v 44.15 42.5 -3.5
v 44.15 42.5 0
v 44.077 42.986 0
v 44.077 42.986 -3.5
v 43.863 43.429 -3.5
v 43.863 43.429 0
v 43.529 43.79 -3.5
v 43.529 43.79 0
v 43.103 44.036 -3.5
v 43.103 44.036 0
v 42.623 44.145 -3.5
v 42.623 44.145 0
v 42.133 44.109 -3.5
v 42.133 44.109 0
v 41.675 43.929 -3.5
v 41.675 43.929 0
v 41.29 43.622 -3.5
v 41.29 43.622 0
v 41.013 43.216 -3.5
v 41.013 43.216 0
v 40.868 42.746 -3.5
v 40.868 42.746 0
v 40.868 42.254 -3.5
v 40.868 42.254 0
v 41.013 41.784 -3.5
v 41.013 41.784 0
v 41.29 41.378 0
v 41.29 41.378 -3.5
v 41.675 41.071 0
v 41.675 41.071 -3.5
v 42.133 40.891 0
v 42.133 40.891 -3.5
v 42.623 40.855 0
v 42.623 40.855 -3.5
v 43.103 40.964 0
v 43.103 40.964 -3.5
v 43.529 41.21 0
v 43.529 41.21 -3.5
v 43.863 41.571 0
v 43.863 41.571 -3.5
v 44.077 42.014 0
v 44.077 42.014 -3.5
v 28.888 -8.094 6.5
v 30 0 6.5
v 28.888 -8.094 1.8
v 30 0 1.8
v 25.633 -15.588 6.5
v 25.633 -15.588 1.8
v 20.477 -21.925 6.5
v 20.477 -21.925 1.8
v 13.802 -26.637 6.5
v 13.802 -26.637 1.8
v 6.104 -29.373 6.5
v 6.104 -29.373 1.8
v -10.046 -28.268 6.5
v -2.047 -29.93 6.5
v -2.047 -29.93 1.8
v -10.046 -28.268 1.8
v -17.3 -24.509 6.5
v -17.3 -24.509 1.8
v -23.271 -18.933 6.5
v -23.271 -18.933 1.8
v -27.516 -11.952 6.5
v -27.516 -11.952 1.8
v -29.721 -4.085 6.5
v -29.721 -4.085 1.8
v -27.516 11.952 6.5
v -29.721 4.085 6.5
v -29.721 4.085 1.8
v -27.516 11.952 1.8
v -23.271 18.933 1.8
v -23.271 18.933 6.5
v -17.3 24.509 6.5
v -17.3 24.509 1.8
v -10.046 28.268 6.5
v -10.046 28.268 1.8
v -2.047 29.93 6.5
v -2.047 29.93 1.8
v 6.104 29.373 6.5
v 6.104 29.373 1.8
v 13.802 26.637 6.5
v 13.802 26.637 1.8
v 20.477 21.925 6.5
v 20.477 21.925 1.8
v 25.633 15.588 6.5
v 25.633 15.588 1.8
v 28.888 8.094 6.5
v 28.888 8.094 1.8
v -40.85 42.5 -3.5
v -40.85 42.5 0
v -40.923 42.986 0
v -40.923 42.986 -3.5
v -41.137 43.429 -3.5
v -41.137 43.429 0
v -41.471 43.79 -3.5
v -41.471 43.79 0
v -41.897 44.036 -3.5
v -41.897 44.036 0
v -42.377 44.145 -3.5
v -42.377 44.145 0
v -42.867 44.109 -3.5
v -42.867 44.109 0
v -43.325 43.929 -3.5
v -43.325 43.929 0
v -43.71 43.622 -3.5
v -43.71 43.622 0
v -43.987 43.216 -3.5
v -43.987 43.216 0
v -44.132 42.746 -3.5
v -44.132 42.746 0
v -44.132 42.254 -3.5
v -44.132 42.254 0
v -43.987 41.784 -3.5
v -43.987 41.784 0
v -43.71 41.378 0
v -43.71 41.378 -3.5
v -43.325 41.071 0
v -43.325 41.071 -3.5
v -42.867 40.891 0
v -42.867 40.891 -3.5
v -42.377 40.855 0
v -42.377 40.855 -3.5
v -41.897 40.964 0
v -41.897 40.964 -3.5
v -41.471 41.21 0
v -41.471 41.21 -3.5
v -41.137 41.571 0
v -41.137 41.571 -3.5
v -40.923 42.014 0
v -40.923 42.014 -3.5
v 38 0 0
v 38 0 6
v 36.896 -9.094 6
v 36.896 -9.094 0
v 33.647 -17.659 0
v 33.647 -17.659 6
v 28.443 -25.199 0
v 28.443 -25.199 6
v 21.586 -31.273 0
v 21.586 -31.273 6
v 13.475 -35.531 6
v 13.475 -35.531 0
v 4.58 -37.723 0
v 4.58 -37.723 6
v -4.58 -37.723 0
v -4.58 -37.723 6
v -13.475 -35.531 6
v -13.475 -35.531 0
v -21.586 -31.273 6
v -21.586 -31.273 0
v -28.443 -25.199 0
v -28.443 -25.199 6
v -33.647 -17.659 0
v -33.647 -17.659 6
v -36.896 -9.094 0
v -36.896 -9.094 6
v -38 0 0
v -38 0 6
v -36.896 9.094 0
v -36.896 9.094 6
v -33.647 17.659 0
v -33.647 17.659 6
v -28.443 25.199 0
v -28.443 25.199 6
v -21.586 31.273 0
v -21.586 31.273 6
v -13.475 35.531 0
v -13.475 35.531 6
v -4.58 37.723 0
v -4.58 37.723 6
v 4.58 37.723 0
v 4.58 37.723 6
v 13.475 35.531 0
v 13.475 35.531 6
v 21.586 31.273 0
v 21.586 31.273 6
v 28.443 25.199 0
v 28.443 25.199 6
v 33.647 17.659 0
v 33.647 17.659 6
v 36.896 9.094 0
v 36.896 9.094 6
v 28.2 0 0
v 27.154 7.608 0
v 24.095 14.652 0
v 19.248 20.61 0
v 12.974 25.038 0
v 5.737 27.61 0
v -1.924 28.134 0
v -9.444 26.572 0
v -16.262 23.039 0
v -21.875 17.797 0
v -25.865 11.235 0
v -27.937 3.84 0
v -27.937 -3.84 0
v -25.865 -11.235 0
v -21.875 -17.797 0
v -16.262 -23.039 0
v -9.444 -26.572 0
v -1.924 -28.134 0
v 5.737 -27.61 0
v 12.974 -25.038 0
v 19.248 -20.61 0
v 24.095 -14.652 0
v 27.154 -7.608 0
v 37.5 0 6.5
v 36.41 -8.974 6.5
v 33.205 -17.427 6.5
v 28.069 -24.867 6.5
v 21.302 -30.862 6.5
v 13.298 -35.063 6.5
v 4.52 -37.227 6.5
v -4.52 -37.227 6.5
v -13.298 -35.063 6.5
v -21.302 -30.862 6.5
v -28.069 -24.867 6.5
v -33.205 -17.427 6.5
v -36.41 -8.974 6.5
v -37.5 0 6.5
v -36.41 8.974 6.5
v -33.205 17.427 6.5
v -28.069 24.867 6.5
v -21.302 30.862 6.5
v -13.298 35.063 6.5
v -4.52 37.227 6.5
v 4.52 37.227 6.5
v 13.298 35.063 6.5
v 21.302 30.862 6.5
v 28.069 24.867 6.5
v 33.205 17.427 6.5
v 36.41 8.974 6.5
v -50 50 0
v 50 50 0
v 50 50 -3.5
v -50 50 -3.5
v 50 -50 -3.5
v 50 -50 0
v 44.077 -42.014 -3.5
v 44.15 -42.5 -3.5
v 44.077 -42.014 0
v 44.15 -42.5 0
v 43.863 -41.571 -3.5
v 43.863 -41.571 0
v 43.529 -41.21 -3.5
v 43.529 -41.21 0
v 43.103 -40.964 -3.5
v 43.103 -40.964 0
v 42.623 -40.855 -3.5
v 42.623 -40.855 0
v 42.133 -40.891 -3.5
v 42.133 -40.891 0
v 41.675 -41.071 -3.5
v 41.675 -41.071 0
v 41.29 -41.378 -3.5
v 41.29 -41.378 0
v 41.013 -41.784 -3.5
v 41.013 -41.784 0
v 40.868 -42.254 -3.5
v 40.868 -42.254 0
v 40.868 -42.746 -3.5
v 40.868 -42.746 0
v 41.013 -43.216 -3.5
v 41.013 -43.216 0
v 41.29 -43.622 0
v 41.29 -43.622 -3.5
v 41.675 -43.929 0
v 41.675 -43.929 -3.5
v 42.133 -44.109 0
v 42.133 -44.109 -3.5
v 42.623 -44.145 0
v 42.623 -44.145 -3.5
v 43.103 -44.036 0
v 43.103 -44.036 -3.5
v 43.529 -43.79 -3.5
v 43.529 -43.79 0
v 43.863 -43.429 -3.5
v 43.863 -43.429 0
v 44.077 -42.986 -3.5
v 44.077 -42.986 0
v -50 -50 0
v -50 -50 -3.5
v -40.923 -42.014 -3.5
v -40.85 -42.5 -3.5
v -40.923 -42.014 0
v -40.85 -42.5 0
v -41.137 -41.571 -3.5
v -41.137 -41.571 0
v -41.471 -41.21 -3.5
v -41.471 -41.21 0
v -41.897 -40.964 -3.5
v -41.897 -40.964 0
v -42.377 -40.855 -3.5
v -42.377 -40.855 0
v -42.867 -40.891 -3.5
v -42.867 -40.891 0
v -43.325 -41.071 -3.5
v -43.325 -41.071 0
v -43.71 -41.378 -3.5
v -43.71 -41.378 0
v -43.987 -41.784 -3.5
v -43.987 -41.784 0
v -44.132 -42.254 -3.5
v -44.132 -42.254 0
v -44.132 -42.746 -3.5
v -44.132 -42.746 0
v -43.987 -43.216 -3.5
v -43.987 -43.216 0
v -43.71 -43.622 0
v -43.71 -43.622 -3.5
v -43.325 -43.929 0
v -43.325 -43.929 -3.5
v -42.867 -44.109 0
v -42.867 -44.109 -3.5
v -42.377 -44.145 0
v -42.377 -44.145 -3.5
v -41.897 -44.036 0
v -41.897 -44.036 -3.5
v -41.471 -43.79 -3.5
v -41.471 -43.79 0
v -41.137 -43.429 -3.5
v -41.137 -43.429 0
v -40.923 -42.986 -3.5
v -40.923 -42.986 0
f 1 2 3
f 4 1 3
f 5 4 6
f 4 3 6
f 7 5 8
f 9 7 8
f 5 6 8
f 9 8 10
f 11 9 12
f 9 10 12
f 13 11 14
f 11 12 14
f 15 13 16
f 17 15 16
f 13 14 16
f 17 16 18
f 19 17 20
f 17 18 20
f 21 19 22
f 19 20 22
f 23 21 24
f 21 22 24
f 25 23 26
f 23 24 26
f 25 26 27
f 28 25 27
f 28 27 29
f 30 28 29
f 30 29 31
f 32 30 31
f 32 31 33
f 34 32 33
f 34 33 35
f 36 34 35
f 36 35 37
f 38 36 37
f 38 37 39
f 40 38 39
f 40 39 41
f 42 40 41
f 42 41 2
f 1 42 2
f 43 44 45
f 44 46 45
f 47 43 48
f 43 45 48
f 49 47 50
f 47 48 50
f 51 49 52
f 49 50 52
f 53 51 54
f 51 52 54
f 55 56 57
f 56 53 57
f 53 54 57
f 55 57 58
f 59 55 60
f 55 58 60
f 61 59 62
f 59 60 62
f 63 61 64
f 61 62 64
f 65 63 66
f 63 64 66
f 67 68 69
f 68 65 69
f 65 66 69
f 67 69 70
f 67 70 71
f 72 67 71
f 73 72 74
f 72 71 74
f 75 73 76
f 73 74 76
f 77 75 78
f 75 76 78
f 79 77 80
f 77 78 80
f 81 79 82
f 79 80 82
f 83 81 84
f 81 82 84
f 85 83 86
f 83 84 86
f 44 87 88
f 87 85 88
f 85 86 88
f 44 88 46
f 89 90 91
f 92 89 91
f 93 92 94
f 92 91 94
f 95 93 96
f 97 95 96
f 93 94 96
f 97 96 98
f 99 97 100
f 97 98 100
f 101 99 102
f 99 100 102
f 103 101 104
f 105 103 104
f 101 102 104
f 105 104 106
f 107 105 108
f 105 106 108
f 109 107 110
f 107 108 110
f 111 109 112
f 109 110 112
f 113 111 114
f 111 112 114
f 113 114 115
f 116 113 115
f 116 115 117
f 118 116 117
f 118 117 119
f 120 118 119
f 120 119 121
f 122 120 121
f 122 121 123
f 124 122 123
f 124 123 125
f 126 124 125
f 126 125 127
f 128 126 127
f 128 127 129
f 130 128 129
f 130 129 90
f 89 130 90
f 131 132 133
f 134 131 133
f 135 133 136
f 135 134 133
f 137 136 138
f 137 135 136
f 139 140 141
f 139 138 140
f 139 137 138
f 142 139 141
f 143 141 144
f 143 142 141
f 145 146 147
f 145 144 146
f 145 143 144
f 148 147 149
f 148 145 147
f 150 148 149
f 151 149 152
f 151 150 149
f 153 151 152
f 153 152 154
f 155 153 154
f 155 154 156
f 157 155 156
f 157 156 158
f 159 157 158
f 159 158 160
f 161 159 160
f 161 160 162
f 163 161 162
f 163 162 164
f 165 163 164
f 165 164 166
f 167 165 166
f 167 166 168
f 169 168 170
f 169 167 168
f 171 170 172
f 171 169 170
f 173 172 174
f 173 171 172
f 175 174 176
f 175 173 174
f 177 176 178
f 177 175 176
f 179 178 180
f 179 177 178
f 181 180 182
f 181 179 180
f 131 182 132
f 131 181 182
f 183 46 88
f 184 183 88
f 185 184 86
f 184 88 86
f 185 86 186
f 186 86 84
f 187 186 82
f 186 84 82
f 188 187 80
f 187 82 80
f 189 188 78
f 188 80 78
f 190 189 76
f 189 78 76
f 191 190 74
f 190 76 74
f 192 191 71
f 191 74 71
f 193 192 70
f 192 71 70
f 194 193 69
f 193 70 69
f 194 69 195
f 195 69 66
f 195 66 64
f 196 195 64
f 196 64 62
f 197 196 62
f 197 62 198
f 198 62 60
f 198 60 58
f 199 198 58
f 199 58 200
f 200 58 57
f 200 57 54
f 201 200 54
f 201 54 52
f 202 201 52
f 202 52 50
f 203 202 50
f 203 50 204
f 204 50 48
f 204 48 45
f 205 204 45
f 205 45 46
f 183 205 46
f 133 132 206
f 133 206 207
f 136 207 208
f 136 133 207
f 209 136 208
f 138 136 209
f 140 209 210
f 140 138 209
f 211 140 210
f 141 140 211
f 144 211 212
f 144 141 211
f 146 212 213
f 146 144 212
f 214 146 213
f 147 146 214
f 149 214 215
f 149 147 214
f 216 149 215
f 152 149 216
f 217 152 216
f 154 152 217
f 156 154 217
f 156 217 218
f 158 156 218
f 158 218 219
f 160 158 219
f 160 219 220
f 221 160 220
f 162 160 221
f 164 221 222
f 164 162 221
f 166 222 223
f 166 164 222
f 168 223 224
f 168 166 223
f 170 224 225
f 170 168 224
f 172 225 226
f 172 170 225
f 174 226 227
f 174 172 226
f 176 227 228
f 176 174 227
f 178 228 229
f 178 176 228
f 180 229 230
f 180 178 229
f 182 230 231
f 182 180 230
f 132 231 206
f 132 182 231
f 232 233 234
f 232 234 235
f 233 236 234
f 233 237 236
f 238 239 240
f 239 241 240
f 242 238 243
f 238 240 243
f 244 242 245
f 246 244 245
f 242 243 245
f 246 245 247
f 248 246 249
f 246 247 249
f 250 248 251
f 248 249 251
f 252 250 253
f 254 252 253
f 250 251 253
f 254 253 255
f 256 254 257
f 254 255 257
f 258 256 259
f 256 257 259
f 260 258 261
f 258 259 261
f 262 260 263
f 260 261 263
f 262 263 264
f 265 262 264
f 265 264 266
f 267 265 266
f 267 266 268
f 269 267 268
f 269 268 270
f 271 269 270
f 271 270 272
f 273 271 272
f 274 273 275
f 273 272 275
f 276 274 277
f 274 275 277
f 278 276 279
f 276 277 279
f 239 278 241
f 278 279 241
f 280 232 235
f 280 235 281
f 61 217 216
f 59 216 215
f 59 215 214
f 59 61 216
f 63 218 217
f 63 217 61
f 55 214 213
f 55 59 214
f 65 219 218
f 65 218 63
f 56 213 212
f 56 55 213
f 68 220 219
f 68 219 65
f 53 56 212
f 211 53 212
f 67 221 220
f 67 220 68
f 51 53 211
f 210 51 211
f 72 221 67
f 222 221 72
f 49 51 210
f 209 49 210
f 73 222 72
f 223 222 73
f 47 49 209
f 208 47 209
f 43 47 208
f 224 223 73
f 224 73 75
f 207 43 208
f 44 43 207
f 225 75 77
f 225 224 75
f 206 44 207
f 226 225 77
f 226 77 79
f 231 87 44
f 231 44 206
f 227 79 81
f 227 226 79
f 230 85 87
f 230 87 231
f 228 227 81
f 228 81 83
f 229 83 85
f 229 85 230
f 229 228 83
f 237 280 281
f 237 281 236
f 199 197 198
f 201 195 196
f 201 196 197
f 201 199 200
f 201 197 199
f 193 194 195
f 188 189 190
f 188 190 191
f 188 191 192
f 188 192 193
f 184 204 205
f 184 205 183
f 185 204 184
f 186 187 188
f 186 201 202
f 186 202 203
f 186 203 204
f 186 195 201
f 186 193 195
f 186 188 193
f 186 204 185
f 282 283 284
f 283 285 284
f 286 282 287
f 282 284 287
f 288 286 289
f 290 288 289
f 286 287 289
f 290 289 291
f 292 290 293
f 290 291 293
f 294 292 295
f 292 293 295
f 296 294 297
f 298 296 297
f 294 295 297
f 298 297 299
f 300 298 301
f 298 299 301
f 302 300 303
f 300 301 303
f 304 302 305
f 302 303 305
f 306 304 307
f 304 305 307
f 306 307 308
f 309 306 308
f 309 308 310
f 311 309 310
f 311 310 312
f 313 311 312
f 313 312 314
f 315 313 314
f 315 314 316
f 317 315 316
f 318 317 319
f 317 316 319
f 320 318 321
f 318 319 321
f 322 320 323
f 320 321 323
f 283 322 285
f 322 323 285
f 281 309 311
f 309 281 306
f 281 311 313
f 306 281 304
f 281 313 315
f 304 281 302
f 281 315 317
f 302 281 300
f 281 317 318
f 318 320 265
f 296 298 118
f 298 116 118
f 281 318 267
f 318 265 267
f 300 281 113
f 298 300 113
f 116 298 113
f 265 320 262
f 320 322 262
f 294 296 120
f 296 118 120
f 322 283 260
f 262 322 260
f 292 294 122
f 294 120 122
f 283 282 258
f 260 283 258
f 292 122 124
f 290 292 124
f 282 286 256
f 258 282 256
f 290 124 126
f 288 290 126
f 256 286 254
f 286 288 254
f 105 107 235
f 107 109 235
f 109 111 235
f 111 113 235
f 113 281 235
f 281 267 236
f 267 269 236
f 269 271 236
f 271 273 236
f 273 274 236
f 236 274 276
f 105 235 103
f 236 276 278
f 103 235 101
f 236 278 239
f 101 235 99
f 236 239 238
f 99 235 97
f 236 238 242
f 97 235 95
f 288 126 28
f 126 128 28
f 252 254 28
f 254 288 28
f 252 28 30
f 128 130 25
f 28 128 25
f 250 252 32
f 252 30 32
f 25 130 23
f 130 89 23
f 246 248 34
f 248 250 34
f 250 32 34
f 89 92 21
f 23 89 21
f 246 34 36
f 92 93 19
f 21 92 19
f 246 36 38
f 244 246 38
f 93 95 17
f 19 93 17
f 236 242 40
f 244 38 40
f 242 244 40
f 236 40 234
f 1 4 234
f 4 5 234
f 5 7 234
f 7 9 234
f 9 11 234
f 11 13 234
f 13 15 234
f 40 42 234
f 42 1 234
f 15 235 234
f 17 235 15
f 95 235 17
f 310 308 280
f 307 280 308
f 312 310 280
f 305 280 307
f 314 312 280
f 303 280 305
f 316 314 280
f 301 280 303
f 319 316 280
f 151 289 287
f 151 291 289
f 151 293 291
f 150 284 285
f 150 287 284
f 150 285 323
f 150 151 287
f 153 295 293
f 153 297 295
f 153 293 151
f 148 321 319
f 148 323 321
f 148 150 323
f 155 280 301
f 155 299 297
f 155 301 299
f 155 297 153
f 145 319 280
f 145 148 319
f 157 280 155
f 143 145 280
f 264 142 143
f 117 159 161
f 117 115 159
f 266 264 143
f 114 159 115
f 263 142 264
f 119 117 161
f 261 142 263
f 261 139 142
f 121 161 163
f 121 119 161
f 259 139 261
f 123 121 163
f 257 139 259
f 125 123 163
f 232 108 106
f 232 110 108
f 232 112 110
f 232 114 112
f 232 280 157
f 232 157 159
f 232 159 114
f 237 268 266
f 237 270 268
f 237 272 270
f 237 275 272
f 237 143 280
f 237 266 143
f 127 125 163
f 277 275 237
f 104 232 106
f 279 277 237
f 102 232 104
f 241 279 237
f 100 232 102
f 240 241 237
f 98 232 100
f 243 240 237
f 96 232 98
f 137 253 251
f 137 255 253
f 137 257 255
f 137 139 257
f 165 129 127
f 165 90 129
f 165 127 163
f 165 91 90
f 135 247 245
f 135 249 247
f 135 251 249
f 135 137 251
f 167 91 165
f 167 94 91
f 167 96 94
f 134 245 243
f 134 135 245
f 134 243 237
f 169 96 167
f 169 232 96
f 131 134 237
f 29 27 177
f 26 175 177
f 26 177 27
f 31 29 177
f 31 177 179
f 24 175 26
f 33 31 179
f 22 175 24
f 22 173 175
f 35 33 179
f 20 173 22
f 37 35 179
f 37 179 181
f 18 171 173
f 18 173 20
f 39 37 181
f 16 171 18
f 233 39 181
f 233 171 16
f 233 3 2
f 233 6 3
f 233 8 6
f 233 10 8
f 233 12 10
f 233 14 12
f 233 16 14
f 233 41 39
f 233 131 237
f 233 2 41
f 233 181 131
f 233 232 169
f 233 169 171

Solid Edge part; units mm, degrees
sketch "Sketch1" plane through (0, 0, 0) normal (0, 0, 1) x (1, 0, 0)
  circle A0 centre (42.5, 42.5) radius 1.65
  circle A1 centre (-42.5, 42.5) radius 1.65
  circle A2 centre (-42.5, -42.5) radius 1.65
  circle A3 centre (42.5, -42.5) radius 1.65
  line L0 (50, 50) -> (-50, 50)
  line L1 (-50, 50) -> (-50, -50)
  line L2 (-50, -50) -> (50, -50)
  line L3 (50, -50) -> (50, 50)
extrude "Protrusion1" add sketch "Sketch1" against normal blind 3.5
sketch "Sketch2" plane through (0, 0, 0) normal (0, 0, 1) x (1, 0, 0)
  circle A0 centre (0, 0) radius 30
  circle A1 centre (0, 0) radius 38
extrude "ExtrudedProtrusion_2" add sketch "Sketch2" along normal blind 6.5
chamfer "Chamfer_1" distance 0.5 angle 45 1 edges at (-38, 0, 6.5)
chamfer "Chamfer_2" distance 1.8 angle 45 1 edges at (-30, 0, 0)
